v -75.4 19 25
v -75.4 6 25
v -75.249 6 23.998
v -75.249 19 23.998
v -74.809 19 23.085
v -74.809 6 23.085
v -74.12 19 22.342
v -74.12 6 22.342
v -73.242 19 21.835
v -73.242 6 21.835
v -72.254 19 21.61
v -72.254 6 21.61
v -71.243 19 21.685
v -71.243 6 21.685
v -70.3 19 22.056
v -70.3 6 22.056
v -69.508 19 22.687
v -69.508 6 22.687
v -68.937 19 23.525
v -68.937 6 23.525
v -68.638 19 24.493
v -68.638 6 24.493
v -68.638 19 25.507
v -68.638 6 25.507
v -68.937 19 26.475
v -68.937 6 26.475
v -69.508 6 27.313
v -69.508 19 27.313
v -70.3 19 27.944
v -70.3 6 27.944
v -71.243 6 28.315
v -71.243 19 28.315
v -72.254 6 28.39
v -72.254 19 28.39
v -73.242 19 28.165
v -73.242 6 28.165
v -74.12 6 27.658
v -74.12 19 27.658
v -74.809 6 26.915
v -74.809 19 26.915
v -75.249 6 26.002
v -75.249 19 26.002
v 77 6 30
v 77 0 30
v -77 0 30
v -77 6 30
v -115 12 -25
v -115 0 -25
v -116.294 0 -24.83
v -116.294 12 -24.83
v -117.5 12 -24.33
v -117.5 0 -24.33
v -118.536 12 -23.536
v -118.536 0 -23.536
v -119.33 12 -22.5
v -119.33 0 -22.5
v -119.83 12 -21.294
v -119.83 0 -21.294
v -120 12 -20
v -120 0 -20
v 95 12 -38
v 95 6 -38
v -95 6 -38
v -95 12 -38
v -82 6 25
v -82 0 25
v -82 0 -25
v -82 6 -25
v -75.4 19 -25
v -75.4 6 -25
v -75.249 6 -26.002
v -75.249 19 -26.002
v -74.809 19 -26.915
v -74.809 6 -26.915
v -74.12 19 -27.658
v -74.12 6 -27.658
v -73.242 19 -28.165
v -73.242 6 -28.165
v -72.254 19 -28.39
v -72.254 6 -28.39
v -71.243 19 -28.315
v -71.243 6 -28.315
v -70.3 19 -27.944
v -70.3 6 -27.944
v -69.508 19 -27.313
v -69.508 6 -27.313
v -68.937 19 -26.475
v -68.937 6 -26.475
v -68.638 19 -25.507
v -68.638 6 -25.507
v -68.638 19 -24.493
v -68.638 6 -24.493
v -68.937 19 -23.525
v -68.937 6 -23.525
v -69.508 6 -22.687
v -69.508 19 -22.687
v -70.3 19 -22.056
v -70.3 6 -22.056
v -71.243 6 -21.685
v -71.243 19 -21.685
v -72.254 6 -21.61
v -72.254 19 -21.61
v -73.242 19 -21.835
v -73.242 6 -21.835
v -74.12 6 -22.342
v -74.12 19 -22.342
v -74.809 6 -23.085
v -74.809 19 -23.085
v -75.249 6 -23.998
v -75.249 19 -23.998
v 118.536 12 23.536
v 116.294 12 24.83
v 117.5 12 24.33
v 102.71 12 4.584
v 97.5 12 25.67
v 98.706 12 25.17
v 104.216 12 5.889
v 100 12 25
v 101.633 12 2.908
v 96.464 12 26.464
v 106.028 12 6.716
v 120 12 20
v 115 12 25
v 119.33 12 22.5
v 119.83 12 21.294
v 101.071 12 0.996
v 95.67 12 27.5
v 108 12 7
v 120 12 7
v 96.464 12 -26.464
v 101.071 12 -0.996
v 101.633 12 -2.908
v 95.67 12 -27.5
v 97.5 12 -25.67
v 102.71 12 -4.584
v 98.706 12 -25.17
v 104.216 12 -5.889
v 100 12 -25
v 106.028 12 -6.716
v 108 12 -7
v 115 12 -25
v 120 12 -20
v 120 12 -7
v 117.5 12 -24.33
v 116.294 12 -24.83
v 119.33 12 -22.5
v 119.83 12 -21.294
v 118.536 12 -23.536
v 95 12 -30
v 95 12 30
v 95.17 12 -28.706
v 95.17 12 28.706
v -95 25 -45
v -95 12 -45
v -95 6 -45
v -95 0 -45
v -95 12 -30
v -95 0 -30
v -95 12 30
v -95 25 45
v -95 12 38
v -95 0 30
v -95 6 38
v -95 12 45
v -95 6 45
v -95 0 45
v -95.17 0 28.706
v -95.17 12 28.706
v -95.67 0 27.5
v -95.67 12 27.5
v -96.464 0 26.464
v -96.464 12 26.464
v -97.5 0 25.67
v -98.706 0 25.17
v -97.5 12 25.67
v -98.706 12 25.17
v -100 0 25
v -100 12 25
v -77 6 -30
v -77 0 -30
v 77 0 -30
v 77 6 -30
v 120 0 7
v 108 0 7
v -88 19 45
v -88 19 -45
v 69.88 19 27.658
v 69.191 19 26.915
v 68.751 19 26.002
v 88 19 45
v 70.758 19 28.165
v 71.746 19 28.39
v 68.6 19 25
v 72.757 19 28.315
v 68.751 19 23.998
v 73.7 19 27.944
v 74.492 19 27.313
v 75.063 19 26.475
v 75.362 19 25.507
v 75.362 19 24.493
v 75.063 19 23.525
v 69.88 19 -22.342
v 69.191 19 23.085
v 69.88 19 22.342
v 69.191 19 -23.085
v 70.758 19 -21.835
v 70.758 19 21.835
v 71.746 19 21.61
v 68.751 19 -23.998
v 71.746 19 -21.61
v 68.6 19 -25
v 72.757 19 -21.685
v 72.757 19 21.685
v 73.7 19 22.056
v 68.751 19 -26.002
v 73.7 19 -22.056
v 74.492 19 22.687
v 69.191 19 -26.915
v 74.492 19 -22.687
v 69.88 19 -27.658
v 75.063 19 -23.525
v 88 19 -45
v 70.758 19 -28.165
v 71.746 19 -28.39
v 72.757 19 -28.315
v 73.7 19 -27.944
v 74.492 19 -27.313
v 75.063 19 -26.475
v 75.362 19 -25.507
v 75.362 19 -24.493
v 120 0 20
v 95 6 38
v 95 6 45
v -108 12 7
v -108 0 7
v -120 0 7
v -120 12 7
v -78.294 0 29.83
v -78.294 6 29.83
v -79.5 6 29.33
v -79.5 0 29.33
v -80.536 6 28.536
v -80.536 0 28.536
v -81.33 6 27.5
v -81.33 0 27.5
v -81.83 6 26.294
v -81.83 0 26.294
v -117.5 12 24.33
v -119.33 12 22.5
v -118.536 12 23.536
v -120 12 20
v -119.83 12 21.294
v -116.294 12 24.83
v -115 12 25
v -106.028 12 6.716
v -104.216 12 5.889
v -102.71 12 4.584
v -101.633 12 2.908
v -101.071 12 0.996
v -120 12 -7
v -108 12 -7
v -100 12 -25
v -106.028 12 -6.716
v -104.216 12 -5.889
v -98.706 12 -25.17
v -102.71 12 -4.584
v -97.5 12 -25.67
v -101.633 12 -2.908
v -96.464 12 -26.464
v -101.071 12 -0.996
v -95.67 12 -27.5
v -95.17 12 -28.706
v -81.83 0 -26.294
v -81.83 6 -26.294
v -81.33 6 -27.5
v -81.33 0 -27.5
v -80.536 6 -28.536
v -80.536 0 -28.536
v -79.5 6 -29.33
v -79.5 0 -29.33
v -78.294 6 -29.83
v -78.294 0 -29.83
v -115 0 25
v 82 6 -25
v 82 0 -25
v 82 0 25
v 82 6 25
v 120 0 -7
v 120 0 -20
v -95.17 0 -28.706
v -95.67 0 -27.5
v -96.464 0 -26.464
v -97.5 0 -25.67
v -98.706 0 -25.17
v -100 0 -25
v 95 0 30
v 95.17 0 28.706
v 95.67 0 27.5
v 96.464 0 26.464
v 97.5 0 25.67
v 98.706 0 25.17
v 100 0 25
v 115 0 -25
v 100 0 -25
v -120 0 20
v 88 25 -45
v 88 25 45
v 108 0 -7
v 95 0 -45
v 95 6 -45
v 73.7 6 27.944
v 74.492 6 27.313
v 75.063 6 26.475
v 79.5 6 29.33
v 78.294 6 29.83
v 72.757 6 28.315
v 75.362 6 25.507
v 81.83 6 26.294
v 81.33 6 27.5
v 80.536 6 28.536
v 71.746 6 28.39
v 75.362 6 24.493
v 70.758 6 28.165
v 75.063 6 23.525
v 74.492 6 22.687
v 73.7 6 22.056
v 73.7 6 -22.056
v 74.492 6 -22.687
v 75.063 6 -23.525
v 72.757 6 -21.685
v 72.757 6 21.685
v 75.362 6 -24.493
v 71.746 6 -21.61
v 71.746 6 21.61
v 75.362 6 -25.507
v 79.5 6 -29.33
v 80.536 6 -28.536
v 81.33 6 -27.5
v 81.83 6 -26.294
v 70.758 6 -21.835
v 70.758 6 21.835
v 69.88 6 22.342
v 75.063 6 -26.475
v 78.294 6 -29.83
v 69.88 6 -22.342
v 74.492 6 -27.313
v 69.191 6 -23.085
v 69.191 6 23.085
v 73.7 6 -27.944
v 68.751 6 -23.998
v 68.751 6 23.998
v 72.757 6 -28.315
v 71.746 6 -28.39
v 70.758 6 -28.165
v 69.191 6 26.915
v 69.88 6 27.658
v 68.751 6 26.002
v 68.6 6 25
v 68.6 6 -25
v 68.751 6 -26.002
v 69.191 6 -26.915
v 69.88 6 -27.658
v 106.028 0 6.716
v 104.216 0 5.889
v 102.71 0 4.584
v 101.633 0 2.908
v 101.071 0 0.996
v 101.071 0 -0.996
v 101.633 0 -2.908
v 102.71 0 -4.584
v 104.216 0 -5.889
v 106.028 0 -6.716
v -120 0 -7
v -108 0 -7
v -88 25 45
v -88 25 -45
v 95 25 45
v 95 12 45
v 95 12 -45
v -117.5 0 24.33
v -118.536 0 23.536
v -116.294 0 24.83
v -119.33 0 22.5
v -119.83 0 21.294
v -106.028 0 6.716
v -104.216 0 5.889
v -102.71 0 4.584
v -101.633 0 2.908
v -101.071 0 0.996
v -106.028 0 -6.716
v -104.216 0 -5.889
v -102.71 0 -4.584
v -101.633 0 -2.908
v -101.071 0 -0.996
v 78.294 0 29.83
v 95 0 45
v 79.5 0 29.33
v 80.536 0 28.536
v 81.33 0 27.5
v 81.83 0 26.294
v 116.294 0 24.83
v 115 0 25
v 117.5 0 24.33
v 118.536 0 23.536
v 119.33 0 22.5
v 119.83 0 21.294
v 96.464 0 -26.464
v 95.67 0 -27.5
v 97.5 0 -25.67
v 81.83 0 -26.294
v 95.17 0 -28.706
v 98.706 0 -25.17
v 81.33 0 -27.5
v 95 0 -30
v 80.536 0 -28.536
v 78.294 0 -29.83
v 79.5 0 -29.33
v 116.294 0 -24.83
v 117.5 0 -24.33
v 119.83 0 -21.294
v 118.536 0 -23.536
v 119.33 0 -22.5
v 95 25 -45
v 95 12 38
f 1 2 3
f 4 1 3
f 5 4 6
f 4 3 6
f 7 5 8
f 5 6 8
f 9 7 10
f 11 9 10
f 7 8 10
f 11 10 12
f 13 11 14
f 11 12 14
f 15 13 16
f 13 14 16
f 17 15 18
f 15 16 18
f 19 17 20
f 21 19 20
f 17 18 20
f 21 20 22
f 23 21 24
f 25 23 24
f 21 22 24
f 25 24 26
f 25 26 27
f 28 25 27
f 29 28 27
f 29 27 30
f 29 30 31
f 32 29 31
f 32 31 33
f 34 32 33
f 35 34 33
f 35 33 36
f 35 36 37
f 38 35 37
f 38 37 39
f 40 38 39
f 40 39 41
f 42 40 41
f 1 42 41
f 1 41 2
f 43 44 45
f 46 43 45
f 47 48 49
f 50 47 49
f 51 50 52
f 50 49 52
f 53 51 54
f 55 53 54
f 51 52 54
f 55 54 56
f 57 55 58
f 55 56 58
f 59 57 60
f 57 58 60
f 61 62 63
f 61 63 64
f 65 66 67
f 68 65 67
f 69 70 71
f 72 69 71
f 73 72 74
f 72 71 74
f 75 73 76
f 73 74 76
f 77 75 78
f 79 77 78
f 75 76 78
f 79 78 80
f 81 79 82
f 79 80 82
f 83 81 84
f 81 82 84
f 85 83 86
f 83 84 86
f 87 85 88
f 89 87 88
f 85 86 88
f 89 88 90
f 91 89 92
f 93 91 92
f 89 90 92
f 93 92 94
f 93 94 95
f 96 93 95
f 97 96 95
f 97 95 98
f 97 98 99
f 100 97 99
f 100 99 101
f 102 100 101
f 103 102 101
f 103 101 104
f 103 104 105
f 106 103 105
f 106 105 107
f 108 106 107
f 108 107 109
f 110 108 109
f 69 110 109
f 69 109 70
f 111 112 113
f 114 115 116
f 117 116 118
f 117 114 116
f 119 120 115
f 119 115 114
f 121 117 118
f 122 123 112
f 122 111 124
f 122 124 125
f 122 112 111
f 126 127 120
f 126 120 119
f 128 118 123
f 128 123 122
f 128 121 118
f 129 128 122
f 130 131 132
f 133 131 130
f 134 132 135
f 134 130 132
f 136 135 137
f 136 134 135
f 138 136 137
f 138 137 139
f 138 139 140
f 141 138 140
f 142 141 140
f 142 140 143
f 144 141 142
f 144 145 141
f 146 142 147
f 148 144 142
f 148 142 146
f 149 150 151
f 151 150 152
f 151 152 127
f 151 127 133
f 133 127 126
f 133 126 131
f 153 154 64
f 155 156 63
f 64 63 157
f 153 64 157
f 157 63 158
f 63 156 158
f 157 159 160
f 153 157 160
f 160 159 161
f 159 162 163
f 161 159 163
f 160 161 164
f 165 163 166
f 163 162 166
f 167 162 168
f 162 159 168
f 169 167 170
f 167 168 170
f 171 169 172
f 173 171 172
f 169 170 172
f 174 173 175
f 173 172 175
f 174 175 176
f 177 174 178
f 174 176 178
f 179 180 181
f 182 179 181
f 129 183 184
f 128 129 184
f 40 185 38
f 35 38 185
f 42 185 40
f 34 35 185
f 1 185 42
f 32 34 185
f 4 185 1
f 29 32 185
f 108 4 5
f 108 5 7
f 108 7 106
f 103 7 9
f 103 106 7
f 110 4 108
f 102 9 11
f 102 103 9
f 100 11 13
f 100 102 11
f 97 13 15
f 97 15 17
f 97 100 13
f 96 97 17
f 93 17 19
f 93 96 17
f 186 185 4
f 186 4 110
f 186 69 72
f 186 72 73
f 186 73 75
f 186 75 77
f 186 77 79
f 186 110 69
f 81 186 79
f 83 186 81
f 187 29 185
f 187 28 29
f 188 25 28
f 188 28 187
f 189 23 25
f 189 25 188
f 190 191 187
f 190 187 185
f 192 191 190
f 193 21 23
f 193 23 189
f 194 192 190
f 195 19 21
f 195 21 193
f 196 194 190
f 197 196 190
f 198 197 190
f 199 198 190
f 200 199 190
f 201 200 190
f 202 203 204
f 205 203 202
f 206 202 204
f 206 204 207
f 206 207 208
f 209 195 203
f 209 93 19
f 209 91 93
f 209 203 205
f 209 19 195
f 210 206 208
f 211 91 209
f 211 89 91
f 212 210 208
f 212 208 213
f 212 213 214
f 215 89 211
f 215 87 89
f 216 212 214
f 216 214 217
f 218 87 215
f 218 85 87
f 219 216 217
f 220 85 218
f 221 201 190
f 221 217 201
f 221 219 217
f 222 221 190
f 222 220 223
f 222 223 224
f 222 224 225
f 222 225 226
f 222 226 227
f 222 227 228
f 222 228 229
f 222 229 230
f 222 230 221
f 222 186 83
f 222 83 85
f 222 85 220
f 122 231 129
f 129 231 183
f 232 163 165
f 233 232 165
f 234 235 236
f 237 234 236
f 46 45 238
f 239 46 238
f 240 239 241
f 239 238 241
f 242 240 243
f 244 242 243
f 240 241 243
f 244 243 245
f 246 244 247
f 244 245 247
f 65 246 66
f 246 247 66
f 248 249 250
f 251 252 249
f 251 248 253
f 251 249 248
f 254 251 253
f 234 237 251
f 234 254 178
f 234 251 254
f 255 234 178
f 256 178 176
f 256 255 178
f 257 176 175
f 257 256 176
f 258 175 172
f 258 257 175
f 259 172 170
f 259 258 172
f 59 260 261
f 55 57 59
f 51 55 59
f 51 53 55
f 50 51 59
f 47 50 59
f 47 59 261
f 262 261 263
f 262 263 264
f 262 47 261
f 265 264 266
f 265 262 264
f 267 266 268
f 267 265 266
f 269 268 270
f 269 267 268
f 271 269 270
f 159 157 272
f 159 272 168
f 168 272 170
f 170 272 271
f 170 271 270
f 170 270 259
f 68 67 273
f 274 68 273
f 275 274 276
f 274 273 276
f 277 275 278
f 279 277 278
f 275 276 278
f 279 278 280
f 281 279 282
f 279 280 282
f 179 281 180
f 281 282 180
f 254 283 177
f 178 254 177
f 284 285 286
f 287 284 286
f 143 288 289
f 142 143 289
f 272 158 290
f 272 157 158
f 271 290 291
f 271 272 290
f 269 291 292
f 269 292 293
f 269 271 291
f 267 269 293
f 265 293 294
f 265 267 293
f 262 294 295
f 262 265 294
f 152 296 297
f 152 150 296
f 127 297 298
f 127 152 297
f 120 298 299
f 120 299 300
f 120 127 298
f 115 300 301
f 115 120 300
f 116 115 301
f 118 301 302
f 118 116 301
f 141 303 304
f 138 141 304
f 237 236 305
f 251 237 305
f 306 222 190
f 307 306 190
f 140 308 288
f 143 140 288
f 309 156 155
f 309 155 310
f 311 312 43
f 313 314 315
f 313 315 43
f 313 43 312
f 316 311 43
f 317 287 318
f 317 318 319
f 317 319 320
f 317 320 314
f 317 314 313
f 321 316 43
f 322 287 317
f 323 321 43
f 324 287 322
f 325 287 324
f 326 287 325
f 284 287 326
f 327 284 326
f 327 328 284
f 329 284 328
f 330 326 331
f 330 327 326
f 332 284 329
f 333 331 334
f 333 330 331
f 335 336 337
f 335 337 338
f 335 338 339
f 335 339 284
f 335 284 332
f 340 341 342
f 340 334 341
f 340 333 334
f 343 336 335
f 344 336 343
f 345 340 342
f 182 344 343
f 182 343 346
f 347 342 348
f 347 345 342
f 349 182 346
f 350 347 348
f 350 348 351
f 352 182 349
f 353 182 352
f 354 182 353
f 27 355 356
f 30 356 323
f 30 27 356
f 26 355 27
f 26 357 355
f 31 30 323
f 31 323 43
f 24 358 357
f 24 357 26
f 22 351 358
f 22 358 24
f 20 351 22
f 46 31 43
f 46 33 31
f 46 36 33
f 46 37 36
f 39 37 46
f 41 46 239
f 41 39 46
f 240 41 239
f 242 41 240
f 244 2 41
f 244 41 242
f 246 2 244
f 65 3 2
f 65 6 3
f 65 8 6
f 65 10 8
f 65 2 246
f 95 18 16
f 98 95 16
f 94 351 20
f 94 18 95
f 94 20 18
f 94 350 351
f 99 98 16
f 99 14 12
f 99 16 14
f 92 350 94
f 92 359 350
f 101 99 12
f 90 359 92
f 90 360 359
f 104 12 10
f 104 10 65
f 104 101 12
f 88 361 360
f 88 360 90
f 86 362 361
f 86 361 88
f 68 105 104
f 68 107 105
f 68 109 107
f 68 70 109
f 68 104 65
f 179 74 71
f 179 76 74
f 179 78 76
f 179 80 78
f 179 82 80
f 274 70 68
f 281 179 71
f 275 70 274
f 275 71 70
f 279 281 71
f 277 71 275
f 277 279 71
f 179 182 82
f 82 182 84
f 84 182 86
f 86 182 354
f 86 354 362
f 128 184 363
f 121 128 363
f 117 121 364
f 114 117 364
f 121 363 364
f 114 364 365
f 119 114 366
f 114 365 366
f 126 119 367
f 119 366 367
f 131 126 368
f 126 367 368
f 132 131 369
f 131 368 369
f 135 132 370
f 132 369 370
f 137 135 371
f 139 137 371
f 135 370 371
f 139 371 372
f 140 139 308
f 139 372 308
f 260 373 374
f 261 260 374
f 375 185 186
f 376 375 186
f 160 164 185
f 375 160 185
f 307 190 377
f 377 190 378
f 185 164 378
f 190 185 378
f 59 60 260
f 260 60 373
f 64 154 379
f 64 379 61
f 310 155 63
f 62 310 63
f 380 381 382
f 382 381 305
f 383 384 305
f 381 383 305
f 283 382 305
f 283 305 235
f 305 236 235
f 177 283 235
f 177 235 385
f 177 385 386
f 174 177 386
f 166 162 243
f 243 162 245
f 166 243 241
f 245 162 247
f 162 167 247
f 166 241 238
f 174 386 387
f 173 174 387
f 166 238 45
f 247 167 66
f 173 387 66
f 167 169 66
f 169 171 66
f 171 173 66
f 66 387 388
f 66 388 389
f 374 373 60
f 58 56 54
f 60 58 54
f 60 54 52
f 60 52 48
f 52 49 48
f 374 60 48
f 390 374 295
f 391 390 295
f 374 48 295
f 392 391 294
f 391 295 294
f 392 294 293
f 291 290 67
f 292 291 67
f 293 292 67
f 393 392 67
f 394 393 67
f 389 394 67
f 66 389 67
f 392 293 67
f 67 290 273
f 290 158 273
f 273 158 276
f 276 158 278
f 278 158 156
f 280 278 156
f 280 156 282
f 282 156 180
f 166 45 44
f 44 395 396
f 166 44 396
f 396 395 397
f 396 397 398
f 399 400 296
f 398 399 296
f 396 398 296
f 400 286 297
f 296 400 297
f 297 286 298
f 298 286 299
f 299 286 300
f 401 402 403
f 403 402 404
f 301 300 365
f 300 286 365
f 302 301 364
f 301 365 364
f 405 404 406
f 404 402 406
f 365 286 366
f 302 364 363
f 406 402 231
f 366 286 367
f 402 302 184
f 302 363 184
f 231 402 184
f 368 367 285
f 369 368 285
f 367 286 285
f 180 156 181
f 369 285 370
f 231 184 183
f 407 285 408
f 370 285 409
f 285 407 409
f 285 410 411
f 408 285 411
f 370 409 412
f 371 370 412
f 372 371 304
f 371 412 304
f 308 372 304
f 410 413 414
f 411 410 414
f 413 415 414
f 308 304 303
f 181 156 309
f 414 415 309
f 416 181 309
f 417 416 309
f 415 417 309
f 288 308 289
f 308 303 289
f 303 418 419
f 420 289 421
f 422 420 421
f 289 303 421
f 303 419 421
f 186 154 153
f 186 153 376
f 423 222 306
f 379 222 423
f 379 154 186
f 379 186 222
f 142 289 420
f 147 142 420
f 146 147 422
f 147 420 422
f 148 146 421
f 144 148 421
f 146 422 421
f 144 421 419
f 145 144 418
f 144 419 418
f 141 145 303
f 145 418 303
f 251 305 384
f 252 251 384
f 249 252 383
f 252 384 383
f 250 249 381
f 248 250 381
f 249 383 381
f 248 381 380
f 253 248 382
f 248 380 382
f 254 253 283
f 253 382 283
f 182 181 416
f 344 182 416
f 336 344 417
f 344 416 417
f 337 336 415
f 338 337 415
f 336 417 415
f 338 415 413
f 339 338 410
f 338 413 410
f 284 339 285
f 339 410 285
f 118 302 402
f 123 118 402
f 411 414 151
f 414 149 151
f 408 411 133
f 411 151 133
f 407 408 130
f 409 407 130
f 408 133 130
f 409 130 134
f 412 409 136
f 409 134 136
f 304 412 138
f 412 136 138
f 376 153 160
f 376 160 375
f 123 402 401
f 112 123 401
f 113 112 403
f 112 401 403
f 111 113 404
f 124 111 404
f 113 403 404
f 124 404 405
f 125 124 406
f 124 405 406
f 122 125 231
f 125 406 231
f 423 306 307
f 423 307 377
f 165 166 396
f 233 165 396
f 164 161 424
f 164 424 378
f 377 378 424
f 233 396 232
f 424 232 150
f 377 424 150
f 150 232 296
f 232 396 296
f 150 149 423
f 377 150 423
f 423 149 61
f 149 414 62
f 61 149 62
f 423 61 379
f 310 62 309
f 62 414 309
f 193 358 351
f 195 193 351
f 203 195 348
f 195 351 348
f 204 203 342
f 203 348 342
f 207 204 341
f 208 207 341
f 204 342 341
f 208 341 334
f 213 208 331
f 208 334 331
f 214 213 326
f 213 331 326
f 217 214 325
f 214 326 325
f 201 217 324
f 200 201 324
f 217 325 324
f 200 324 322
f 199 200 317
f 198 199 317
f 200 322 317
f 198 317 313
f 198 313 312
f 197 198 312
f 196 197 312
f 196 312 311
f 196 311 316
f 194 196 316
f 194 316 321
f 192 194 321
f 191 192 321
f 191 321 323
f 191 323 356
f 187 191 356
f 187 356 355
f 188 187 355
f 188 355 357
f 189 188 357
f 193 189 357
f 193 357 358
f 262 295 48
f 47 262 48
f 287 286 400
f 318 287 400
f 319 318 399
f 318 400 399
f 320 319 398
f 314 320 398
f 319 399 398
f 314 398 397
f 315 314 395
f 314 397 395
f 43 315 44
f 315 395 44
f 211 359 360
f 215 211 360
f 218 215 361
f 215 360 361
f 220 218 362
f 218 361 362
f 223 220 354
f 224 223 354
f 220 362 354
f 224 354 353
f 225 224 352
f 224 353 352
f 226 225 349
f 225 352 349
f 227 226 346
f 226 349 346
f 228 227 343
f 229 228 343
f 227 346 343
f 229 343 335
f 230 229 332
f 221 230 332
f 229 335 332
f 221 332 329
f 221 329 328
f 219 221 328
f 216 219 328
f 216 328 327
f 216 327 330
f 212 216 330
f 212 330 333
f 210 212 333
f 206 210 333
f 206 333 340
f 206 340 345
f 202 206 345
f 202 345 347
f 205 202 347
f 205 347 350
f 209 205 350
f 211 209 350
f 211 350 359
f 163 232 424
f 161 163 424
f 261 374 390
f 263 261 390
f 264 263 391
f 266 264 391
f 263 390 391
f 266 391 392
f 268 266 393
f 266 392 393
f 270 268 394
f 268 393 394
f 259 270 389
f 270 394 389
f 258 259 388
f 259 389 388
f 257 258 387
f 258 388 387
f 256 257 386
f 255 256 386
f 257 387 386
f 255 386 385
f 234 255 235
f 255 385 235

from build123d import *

# Parameters (mm, degrees)
BOSS_EXTRUDE2_DEPTH     = 25
BOSS_EXTRUDE2_2_DEPTH   = 25
SKETCH1_4_W             = 176
SKETCH1_4_H             = 90
BOSS_EXTRUDE3_DEPTH     = 19
BOSS_EXTRUDE4_DEPTH     = 12
FILLET2_R               = 5
CUT_EXTRUDE3_DEPTH      = 6
CUT_EXTRUDE4_DEPTH      = 222.076909694
CUT_EXTRUDE4_DEPTH_BACK = 222.076909694
SKETCH7_W               = 7
SKETCH7_H               = 6
M8_TAPPED_HOLE1_D       = 6.8


with BuildPart() as part:
    # Sketch1 → Boss-Extrude2 (new body)
    with BuildSketch(Plane(origin=(0, 0, 0), x_dir=(1, 0, 0), z_dir=(0, 1, 0))):
        Polygon((-95, 45), (-95, 25), (-95, -25), (-95, -45), (-88, -45), (-88, 45), align=None)
    extrude(amount=BOSS_EXTRUDE2_DEPTH)



with BuildPart() as body_2:
    # Sketch1 → Boss-Extrude2 2 (new body)
    with BuildSketch(Plane(origin=(0, 0, 0), x_dir=(1, 0, 0), z_dir=(0, 1, 0))):
        Polygon((95, 45), (88, 45), (88, -45), (95, -45), (95, -25), (95, 25), align=None)
    extrude(amount=BOSS_EXTRUDE2_2_DEPTH)


with BuildPart() as part_1:
    add(part.part)

    add(body_2.part)  # Boss-Extrude3 merges body 2
    # Sketch1<4> → Boss-Extrude3 (add)
    # profile 1 of 2: a face of its own
    with BuildSketch(Plane(origin=(0, 0, 0), x_dir=(1, 0, 0), z_dir=(0, 1, 0))):
        Rectangle(SKETCH1_4_W, SKETCH1_4_H)
        with BuildLine():
            Line((77, -30), (-77, -30))
            ThreePointArc((-77, -30), (-80.535533906, -28.535533906), (-82, -25))
            Line((-82, -25), (-82, 25))
            ThreePointArc((-82, 25), (-80.535533906, 28.535533906), (-77, 30))
            Line((-77, 30), (77, 30))
            ThreePointArc((77, 30), (80.535533906, 28.535533906), (82, 25))
            Line((82, 25), (82, -25))
            ThreePointArc((82, -25), (80.535533906, -28.535533906), (77, -30))
        make_face(mode=Mode.SUBTRACT)
    # profile 2 of 2: a face of its own
    with BuildSketch(Plane(origin=(0, 0, 0), x_dir=(1, 0, 0), z_dir=(0, 1, 0))):
        with BuildLine():
            ThreePointArc((-82, 25), (-80.535533906, 28.535533906), (-77, 30))
            Line((-77, 30), (77, 30))
            ThreePointArc((77, 30), (80.535533906, 28.535533906), (82, 25))
            Line((82, 25), (82, -25))
            ThreePointArc((82, -25), (80.535533906, -28.535533906), (77, -30))
            Line((77, -30), (-77, -30))
            ThreePointArc((-77, -30), (-80.535533906, -28.535533906), (-82, -25))
            Line((-82, -25), (-82, 25))
        make_face()
    extrude(amount=BOSS_EXTRUDE3_DEPTH)

    # Sketch1<5> → Boss-Extrude4 (add)
    with BuildSketch(Plane(origin=(0, 0, 0), x_dir=(1, 0, 0), z_dir=(0, 1, 0))):
        with BuildLine():
            Line((115, 25), (95, 25))
            Line((95, 25), (95, -25))
            Line((95, -25), (115, -25))
            ThreePointArc((115, -25), (118.535533906, -23.535533906), (120, -20))
            Line((120, -20), (120, -7))
            Line((120, -7), (108, -7))
            ThreePointArc((108, -7), (101, 0), (108, 7))
            Line((108, 7), (120, 7))
            Line((120, 7), (120, 20))
            ThreePointArc((120, 20), (118.535533906, 23.535533906), (115, 25))
        make_face()
        with BuildLine():
            Line((-95, -25), (-95, 25))
            Line((-95, 25), (-115, 25))
            ThreePointArc((-115, 25), (-118.535533906, 23.535533906), (-120, 20))
            Line((-120, 20), (-120, 7))
            Line((-120, 7), (-108, 7))
            ThreePointArc((-108, 7), (-101, 0), (-108, -7))
            Line((-108, -7), (-120, -7))
            Line((-120, -7), (-120, -20))
            ThreePointArc((-120, -20), (-118.535533906, -23.535533906), (-115, -25))
            Line((-115, -25), (-95, -25))
        make_face()
    extrude(amount=BOSS_EXTRUDE4_DEPTH)

    # Fillet2
    fillet2_edges = [part_1.edges().sort_by_distance(p)[0] for p in [
        (95, 6, -25),
        (95, 6, 25),
        (-95, 6, 25),
        (-95, 6, -25),
    ]]
    fillet(fillet2_edges, radius=FILLET2_R)

    # Sketch1<6> → Cut-Extrude3 (cut)
    with BuildSketch(Plane(origin=(0, 0, 0), x_dir=(1, 0, 0), z_dir=(0, 1, 0))):
        with BuildLine():
            ThreePointArc((-82, 25), (-80.535533906, 28.535533906), (-77, 30))
            Line((-77, 30), (77, 30))
            ThreePointArc((77, 30), (80.535533906, 28.535533906), (82, 25))
            Line((82, 25), (82, -25))
            ThreePointArc((82, -25), (80.535533906, -28.535533906), (77, -30))
            Line((77, -30), (-77, -30))
            ThreePointArc((-77, -30), (-80.535533906, -28.535533906), (-82, -25))
            Line((-82, -25), (-82, 25))
        make_face()
    extrude(amount=CUT_EXTRUDE3_DEPTH, mode=Mode.SUBTRACT)

    # Sketch7 → Cut-Extrude4 (cut, two sides: drawn at the far end of the back side and taken through both)
    with BuildSketch(Plane.ZY.offset(95).offset(-CUT_EXTRUDE4_DEPTH_BACK)):
        with Locations((41.5, 9)):
            Rectangle(SKETCH7_W, SKETCH7_H)
        with Locations((-41.5, 9)):
            Rectangle(SKETCH7_W, SKETCH7_H)
    extrude(amount=CUT_EXTRUDE4_DEPTH + CUT_EXTRUDE4_DEPTH_BACK, mode=Mode.SUBTRACT)

    # M8 Tapped Hole1 (through all)
    with Locations(Plane(origin=(0, 19, 0), x_dir=(1, 0, 0), z_dir=(0, 1, 0))):
        with Locations((-72, 25), (72, 25), (72, -25), (-72, -25)):
            Hole(M8_TAPPED_HOLE1_D / 2)


solid = part_1.part
